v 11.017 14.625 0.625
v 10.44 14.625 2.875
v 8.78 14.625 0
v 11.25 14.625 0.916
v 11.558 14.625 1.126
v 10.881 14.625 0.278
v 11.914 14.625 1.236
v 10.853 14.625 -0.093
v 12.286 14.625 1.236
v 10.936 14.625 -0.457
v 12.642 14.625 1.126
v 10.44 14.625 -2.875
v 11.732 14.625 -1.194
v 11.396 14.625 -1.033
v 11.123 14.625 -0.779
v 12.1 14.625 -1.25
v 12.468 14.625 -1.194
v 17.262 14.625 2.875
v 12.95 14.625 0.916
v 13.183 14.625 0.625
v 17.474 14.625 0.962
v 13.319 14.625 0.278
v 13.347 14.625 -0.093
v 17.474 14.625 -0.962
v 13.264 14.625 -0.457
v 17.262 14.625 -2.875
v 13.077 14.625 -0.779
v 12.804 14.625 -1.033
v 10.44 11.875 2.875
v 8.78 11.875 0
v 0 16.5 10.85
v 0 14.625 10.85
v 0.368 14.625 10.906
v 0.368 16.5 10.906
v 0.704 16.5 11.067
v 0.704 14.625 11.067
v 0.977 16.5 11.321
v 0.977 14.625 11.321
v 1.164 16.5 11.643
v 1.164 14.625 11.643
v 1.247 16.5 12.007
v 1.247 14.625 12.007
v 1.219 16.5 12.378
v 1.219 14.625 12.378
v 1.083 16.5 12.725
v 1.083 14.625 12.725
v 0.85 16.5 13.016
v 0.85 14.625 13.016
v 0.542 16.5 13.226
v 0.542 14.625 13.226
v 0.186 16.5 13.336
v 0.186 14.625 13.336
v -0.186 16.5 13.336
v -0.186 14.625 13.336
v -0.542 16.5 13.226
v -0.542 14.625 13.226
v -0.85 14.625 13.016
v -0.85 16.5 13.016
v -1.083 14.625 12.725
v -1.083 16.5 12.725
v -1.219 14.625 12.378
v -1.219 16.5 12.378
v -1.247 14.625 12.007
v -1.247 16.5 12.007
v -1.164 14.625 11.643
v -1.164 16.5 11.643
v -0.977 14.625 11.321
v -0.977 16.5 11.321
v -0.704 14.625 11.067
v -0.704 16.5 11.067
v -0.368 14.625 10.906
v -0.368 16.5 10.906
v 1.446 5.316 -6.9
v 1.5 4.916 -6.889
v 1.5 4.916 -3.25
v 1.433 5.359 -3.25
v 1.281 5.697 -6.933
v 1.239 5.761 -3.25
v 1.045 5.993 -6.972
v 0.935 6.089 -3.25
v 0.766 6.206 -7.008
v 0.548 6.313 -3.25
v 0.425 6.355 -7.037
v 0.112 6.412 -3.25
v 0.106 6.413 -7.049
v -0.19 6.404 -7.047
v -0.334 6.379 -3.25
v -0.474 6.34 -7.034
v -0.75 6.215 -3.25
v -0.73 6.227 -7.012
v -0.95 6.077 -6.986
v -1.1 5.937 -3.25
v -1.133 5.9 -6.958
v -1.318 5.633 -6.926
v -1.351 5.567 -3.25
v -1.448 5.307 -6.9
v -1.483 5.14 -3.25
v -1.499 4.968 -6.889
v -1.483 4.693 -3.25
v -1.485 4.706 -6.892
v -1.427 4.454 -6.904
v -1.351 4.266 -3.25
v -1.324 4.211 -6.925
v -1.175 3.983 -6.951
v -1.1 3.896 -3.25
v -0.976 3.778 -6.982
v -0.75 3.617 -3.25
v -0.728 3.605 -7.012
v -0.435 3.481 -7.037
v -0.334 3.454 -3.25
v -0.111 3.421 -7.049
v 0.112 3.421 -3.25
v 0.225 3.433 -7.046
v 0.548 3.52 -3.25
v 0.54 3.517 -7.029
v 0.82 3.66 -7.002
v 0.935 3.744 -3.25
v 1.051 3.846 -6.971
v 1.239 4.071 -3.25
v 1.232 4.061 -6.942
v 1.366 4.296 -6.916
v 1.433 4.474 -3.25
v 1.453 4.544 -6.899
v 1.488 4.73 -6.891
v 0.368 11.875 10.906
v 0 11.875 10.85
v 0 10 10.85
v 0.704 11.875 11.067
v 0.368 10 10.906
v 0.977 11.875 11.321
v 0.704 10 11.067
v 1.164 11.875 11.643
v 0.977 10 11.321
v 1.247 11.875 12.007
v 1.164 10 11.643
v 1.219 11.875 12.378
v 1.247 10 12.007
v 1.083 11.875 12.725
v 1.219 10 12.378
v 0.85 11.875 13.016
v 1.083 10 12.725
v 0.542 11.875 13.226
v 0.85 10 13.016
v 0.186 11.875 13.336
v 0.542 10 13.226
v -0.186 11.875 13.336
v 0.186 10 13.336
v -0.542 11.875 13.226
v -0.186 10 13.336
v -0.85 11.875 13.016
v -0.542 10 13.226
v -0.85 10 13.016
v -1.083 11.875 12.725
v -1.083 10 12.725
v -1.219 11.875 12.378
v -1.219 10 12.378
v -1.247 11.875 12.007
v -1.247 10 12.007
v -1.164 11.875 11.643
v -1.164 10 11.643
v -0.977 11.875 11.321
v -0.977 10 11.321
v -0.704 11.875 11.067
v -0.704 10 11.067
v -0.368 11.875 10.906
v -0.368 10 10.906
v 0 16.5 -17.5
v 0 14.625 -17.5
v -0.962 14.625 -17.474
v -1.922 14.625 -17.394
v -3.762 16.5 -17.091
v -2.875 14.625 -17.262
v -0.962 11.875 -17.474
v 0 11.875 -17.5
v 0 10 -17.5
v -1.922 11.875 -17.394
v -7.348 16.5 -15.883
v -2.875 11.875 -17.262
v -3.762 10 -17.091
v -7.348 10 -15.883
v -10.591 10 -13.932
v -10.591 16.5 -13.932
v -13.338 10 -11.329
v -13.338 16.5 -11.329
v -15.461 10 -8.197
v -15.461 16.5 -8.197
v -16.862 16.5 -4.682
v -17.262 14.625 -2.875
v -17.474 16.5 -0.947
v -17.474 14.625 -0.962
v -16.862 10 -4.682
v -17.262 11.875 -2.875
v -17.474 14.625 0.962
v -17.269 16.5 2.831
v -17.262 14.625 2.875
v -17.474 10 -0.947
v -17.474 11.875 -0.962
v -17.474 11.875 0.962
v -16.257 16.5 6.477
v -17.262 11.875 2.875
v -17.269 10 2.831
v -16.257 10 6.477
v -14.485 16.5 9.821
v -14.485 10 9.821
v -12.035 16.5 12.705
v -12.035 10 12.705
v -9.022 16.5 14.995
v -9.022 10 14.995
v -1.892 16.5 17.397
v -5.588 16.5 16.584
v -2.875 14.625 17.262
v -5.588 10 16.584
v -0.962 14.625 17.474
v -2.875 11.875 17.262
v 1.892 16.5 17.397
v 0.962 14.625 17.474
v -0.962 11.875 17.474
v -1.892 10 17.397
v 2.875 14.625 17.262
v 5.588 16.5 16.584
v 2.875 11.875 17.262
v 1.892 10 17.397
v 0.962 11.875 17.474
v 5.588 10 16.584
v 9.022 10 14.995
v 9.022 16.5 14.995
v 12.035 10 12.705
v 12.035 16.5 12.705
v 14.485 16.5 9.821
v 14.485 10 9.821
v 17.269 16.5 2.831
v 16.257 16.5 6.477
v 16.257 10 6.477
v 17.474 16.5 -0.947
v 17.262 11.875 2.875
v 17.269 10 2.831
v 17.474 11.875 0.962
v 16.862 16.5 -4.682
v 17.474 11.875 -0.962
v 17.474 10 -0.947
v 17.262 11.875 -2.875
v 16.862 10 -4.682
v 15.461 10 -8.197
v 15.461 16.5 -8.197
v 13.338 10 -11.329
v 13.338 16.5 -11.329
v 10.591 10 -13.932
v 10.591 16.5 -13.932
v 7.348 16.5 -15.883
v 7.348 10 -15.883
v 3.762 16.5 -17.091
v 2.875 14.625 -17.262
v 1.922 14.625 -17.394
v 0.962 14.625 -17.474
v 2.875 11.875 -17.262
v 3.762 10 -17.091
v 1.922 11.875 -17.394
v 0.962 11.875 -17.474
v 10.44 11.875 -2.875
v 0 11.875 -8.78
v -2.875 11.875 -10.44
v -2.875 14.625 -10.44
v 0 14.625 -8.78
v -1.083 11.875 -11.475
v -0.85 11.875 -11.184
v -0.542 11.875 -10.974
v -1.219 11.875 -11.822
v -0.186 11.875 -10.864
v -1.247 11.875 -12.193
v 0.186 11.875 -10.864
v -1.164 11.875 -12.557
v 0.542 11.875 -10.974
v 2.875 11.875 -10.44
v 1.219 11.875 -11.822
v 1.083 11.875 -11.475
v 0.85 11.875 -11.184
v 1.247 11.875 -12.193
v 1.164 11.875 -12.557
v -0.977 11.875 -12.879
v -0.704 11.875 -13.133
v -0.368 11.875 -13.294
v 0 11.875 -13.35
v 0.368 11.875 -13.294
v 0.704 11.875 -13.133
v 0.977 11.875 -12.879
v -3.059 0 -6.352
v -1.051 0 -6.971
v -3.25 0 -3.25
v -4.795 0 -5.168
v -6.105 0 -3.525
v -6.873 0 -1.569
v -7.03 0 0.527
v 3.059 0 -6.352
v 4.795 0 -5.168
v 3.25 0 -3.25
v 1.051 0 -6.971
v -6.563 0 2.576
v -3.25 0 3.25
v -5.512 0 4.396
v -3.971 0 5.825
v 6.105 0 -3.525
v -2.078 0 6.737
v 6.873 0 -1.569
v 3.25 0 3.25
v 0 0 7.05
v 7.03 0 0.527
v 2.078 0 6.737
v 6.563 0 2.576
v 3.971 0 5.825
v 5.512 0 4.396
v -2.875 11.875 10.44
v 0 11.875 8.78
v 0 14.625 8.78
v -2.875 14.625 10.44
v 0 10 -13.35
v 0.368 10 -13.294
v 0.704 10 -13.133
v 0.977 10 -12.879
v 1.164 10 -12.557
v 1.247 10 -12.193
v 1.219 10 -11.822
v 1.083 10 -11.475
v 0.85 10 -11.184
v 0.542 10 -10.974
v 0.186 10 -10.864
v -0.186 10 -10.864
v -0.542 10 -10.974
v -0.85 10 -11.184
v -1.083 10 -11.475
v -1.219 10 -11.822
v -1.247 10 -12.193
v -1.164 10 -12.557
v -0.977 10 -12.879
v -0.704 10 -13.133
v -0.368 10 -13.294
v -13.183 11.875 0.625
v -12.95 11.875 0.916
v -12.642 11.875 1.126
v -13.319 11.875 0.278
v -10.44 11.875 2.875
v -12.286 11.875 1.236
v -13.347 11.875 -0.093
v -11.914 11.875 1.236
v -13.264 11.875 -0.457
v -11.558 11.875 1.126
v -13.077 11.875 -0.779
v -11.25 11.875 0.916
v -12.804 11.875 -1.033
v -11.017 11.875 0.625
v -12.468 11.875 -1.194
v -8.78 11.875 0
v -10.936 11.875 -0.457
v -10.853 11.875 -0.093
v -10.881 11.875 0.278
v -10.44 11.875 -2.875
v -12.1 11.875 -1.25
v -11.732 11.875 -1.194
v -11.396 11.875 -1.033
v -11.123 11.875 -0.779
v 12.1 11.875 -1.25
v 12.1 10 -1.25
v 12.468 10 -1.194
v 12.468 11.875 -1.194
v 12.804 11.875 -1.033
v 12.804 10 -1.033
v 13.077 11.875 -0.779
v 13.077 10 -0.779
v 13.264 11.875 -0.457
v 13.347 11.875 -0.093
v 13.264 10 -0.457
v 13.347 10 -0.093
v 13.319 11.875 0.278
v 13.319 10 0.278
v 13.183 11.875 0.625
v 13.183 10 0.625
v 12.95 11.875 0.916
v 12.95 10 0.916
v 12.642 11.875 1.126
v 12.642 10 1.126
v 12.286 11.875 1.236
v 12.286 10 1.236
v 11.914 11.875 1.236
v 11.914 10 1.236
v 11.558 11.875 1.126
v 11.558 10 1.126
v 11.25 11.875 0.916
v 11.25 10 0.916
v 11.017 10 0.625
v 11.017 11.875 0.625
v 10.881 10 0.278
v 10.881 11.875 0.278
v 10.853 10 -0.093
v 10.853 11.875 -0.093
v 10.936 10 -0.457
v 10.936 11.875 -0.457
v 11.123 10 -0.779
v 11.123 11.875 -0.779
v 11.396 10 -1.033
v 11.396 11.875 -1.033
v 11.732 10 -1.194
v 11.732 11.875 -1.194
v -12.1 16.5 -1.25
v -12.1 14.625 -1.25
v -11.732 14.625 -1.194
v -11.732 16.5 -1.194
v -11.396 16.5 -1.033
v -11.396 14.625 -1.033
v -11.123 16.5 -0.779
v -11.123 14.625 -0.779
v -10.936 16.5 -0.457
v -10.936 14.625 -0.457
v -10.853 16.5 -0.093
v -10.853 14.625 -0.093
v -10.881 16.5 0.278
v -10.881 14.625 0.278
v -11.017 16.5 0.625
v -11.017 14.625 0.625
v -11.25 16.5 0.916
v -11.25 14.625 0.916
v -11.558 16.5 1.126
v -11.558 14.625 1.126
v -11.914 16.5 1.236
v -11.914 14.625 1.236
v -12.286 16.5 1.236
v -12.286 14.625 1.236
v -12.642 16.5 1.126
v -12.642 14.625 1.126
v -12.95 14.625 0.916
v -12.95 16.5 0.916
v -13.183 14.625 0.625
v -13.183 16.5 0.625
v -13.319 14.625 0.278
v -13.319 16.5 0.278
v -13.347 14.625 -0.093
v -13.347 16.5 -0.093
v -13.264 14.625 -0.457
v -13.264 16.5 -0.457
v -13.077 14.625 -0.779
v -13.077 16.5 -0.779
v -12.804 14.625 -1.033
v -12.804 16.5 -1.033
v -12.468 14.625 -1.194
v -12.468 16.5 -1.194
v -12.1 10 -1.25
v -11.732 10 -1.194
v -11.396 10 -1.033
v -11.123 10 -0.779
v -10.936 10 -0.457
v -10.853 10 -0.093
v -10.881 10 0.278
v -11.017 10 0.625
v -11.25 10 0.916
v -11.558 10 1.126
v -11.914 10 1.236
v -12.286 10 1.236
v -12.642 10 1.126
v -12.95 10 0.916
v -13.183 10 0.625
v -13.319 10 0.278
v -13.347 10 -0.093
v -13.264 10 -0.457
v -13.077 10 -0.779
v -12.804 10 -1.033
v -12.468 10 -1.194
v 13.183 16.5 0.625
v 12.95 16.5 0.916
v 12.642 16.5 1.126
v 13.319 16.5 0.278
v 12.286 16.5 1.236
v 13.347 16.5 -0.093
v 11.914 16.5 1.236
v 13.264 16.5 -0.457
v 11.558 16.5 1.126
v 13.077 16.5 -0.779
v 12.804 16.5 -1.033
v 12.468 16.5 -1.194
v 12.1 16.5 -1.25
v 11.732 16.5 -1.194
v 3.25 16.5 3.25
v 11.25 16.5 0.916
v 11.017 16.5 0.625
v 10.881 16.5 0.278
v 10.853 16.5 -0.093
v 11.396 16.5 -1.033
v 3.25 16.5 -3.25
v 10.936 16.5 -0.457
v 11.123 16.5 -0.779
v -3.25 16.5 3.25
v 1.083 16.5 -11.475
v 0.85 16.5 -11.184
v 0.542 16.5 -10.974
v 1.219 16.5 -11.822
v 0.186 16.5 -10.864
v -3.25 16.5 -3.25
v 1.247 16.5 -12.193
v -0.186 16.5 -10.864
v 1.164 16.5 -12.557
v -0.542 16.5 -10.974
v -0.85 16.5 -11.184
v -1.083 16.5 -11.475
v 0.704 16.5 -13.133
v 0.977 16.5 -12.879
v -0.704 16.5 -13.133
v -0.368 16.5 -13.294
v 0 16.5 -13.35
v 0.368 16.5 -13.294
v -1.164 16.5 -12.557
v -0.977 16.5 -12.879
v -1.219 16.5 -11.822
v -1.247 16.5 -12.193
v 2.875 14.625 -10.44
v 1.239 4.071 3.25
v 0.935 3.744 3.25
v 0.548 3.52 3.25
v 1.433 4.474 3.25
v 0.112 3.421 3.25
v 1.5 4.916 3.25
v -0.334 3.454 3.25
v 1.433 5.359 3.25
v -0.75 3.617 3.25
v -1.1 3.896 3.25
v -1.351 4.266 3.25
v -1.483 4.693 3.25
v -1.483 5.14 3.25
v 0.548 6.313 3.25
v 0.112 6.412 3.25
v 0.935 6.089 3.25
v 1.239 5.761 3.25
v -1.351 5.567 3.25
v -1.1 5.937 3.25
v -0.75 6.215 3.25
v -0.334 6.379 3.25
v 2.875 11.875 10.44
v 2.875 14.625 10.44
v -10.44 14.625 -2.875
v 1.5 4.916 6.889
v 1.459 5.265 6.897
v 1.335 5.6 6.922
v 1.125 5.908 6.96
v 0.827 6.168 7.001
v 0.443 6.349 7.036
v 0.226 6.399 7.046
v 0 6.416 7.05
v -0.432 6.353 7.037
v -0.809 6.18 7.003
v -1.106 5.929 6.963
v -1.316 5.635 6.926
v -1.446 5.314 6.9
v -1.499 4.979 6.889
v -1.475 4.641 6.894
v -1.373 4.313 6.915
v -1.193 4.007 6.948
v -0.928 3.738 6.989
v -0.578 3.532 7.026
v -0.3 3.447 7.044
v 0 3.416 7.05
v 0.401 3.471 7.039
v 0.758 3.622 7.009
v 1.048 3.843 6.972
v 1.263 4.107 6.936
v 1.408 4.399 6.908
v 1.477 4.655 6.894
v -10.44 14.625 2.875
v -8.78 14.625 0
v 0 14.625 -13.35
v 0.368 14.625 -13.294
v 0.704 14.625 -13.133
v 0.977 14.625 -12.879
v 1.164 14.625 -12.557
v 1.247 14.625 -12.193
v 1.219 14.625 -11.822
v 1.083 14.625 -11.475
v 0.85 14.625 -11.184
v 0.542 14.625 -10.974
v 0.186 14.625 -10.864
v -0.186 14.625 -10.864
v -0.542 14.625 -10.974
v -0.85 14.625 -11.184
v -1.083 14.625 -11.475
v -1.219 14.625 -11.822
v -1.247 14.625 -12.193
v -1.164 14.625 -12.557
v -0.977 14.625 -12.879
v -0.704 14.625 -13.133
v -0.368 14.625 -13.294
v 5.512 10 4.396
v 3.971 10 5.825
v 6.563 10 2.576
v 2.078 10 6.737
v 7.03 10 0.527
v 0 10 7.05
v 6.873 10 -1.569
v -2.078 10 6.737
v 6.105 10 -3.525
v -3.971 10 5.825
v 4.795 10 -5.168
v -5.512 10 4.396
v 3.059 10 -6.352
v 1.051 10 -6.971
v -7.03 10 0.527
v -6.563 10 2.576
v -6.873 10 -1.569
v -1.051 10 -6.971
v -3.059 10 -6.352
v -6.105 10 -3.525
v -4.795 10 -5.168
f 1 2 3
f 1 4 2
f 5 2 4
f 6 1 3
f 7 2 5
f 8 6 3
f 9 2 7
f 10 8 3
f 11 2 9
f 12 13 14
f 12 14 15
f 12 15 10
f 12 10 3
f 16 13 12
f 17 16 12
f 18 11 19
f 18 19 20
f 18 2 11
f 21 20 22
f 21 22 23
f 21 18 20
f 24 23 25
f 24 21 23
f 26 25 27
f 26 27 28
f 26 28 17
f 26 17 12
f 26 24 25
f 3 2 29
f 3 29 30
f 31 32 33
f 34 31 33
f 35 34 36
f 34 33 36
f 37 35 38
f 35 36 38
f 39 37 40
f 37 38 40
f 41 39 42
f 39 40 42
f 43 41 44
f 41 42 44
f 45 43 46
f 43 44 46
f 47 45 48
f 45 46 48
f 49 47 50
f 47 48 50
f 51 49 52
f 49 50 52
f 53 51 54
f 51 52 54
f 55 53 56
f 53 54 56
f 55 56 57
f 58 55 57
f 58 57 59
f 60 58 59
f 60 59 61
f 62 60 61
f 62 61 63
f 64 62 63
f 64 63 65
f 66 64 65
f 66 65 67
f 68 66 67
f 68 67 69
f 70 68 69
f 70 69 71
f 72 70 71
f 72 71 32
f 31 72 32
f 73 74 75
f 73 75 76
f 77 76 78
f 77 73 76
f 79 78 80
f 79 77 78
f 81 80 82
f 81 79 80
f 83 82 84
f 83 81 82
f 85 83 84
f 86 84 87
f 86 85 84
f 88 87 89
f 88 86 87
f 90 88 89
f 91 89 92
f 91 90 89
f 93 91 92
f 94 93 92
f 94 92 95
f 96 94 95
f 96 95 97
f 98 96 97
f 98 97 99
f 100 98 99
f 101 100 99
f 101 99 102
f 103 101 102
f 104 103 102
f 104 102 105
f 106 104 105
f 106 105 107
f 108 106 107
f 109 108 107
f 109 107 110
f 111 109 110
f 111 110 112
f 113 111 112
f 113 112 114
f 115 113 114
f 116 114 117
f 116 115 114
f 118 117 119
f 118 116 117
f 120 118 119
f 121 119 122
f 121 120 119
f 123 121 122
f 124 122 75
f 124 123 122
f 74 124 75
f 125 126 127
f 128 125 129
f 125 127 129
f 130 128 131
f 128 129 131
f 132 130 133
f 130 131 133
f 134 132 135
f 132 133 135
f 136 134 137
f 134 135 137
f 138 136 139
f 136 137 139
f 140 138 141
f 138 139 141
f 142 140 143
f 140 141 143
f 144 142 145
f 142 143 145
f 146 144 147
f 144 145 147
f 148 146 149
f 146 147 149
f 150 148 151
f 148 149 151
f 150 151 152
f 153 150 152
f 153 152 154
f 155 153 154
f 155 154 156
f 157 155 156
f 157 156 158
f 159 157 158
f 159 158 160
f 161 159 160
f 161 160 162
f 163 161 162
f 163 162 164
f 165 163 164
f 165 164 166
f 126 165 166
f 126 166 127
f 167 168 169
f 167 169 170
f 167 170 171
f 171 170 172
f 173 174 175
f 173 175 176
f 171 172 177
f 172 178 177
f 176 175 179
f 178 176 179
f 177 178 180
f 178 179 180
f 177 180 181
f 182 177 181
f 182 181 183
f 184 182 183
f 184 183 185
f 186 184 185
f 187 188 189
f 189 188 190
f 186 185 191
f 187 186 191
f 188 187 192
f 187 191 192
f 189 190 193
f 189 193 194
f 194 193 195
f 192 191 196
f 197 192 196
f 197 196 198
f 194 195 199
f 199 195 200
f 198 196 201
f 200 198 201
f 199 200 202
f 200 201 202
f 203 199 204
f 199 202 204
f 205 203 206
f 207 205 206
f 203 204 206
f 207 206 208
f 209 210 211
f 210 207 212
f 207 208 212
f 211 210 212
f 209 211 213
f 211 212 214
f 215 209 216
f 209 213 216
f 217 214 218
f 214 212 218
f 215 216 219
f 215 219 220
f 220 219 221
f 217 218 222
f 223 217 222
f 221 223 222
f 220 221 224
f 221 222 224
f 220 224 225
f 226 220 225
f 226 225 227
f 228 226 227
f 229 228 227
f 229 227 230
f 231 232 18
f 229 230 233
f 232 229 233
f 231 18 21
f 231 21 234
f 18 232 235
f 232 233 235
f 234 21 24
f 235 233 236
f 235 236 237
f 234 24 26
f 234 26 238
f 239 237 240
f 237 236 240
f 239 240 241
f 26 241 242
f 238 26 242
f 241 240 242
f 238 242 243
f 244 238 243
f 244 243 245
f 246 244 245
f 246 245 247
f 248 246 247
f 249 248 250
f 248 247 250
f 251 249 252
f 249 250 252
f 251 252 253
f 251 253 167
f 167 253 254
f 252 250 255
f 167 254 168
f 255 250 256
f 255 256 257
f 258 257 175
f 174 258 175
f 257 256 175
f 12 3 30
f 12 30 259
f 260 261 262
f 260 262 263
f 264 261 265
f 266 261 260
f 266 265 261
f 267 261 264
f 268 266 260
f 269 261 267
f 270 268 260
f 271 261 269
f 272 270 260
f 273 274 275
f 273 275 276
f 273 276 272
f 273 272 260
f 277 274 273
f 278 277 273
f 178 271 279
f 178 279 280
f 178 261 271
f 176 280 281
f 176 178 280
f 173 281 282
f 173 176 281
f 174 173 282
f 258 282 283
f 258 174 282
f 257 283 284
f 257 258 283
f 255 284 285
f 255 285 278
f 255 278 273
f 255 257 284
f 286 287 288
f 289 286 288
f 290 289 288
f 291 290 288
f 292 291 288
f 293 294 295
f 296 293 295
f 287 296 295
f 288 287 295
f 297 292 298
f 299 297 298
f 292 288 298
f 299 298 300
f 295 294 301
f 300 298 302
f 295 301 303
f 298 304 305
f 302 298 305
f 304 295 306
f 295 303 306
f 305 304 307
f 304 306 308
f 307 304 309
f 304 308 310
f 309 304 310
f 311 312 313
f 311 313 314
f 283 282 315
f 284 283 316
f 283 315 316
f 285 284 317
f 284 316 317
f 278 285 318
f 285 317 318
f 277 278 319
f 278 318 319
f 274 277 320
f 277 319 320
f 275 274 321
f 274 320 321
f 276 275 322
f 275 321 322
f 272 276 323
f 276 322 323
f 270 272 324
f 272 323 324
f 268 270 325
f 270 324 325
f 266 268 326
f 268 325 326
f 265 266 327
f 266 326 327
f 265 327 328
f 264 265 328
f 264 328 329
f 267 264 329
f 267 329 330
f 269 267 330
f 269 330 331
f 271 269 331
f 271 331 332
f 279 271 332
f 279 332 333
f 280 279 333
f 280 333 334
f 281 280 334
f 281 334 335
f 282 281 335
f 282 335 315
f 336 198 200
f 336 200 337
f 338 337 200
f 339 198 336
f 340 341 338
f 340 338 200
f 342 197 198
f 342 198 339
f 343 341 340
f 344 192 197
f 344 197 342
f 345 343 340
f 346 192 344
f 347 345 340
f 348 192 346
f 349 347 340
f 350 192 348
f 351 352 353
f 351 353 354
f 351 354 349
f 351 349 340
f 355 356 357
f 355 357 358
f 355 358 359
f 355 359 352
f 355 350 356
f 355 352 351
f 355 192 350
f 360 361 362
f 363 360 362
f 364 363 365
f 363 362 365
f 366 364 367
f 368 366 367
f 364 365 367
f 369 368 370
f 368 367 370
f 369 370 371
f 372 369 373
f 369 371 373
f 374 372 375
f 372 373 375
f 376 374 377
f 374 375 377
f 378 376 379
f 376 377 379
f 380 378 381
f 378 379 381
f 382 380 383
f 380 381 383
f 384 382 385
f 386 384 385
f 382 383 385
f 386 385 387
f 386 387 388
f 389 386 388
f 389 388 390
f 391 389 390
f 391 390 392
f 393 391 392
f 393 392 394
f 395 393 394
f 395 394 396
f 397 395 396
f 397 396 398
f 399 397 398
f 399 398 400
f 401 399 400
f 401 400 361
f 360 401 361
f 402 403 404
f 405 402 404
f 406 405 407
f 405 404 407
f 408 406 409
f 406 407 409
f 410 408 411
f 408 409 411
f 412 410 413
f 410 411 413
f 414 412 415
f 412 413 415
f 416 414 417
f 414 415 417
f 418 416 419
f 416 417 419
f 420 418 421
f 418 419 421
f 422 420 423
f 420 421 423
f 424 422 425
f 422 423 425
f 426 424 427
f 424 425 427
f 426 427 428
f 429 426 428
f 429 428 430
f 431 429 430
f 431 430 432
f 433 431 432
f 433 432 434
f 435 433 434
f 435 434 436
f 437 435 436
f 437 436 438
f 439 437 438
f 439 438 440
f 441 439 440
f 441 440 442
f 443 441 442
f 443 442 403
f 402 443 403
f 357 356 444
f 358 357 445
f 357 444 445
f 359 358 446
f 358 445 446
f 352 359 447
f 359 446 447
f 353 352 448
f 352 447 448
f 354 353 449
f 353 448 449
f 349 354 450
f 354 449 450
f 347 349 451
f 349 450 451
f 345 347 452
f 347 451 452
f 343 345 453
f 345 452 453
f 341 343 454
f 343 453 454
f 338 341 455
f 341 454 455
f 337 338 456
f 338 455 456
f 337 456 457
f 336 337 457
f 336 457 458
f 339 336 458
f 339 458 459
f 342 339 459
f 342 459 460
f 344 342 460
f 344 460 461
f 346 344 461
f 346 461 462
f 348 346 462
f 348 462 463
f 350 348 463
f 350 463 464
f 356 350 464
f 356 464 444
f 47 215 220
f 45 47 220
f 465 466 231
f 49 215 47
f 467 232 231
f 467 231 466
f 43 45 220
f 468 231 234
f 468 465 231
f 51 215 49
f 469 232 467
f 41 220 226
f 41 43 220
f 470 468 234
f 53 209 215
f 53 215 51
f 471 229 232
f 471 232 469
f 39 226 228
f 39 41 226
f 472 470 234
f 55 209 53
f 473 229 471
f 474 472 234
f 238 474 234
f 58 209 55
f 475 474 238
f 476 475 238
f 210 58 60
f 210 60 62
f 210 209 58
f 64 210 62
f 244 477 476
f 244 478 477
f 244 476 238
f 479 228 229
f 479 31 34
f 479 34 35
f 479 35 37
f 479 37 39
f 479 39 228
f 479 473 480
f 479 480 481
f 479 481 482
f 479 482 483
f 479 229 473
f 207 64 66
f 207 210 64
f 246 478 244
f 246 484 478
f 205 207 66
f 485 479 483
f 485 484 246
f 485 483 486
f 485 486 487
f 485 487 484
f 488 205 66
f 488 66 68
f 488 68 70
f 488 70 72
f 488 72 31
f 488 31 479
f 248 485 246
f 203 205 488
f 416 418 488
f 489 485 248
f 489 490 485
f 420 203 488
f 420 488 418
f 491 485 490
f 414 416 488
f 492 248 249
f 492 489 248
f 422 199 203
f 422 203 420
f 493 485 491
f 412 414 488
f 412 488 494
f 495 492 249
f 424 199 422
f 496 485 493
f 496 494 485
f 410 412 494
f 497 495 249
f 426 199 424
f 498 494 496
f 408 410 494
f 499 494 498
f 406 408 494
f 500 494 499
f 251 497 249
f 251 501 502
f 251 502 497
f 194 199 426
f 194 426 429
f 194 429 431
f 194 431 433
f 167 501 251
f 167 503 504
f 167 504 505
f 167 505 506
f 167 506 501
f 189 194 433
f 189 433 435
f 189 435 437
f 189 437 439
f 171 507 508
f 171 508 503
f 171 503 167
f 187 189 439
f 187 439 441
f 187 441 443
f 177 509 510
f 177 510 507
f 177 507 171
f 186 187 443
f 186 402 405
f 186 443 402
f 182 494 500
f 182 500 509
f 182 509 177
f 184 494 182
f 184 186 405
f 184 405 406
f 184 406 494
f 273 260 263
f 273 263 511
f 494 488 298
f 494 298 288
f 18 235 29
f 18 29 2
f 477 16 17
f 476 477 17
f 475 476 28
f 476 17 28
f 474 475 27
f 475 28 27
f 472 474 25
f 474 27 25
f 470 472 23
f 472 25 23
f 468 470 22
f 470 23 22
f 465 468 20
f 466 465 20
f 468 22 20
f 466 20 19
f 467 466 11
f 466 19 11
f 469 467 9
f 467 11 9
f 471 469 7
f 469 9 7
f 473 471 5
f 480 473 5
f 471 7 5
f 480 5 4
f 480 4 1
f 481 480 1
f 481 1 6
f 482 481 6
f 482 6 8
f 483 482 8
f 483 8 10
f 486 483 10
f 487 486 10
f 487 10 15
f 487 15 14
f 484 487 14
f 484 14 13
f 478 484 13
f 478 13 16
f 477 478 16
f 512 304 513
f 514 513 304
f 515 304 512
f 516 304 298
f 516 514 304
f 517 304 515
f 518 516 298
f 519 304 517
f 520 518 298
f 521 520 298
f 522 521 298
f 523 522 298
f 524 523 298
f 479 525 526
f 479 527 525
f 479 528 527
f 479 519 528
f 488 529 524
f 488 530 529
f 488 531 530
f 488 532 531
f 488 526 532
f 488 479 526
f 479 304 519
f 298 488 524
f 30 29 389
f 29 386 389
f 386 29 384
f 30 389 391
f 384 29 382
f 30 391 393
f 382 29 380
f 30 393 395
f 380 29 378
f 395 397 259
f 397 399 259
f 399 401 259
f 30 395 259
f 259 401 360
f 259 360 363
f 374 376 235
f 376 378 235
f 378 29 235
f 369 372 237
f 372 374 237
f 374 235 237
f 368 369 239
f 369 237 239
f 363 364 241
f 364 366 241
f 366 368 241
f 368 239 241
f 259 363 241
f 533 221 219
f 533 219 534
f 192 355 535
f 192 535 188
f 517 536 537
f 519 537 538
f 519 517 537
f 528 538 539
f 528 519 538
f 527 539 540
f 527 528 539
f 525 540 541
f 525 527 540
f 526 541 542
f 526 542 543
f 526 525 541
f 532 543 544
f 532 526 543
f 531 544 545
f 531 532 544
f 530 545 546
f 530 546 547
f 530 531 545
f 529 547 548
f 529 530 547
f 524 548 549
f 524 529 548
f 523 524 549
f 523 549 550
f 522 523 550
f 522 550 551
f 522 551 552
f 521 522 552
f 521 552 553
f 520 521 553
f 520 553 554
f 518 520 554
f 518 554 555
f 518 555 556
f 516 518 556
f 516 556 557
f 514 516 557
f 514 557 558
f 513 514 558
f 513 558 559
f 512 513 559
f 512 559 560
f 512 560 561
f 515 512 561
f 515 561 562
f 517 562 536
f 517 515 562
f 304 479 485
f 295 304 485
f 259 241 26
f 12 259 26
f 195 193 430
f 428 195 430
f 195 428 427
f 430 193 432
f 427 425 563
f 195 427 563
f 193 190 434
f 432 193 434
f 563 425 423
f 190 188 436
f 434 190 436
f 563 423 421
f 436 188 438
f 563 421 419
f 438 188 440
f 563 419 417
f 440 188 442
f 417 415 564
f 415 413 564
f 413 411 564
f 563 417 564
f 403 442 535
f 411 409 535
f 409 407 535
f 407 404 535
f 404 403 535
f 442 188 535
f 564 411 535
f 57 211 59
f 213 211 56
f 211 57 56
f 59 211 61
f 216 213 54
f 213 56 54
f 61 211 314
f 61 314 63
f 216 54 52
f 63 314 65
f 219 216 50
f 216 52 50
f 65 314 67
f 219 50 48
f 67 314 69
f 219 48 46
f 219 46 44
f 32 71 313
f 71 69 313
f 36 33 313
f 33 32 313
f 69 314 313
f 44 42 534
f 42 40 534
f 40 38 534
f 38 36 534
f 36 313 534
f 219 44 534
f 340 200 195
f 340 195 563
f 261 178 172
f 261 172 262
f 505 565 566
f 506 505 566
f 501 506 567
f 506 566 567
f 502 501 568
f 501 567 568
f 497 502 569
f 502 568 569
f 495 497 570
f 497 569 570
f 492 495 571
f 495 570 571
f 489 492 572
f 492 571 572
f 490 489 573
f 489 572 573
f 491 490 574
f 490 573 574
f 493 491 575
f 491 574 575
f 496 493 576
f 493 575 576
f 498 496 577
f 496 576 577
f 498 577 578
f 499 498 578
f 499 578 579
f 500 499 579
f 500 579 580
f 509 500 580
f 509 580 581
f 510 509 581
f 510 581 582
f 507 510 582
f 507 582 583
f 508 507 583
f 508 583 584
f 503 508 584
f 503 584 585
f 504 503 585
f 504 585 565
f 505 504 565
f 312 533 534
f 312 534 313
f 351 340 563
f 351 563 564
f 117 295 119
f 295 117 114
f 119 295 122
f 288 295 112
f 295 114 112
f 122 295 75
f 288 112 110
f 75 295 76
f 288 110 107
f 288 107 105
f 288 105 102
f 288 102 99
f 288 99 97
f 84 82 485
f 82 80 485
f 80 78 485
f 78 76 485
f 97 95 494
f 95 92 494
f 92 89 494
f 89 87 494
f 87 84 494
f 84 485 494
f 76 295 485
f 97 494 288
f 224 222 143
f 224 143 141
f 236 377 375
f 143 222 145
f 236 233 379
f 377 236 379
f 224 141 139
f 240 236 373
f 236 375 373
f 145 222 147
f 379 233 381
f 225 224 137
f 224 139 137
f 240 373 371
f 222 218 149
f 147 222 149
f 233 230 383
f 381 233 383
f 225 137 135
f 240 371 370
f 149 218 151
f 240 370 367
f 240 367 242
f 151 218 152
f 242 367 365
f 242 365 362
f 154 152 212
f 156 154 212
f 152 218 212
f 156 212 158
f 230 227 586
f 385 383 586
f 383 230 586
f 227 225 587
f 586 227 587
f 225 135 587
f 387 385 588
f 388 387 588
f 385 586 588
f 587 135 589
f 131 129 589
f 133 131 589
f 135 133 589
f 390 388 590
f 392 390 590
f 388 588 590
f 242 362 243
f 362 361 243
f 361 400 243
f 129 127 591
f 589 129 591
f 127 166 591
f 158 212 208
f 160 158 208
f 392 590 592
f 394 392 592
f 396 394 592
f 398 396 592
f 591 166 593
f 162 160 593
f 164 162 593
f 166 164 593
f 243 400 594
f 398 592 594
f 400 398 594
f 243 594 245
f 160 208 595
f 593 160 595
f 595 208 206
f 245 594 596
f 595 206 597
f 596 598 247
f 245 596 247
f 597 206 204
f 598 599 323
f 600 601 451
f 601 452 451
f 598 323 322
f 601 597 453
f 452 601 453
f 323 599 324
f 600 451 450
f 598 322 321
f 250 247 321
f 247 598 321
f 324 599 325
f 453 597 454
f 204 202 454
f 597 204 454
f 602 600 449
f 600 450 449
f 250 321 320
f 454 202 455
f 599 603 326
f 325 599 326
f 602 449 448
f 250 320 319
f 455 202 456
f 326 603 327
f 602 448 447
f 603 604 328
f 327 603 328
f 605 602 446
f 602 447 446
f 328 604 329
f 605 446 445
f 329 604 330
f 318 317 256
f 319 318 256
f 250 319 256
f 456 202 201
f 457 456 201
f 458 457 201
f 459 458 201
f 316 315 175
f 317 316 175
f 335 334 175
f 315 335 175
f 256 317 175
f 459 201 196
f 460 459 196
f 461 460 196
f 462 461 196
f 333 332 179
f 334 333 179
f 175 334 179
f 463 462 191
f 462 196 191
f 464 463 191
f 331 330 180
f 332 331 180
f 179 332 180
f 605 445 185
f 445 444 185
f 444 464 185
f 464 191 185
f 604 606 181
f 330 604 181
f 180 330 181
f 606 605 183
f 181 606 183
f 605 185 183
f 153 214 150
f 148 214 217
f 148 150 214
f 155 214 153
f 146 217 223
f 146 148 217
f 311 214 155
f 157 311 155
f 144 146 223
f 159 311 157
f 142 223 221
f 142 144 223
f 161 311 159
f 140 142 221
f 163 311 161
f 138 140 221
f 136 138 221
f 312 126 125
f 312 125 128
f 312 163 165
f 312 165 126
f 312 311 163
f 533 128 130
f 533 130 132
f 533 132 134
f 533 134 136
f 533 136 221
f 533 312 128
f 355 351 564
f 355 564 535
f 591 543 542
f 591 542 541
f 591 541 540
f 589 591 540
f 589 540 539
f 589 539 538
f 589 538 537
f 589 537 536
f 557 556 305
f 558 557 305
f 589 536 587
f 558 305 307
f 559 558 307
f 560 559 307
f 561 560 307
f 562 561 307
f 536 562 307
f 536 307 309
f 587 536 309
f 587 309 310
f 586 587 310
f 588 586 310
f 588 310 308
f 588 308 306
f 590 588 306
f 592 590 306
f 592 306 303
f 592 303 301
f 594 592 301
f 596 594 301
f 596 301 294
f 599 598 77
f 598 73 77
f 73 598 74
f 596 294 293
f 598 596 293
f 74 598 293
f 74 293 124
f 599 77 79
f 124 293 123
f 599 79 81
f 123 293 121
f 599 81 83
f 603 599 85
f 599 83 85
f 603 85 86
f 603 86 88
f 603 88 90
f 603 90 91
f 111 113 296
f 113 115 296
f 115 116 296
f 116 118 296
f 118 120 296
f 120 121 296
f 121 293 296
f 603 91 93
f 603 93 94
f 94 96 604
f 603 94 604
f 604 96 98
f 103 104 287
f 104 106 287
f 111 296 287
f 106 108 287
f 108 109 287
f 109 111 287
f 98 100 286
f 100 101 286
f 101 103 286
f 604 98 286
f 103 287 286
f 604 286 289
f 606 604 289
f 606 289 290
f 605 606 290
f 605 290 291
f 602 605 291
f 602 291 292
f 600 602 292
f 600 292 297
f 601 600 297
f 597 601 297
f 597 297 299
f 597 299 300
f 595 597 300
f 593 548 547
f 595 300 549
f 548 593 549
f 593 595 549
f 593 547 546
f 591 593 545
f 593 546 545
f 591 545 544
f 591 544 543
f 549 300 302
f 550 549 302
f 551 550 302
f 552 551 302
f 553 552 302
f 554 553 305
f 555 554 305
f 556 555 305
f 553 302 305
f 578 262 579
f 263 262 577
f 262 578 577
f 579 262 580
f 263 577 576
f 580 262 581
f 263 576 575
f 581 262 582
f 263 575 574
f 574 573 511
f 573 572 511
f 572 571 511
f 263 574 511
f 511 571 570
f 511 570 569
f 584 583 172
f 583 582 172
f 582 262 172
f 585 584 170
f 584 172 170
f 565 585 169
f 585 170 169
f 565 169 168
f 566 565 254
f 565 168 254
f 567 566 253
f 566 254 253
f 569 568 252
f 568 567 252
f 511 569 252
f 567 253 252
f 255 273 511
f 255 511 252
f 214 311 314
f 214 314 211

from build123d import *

# Parameters (mm, degrees)
SKETCH1_R               = 7.05
SKETCH1_W               = 6.5
SKETCH1_H               = 6.5
BOSS_EXTRUDE1_DEPTH     = 10
SKETCH2_R               = 17.5
BOSS_EXTRUDE2_DEPTH     = 6.5
CUT_EXTRUDE1_REACH      = 28.693
SKETCH3_R               = 1.25
CUT_EXTRUDE2_DEPTH      = 30.744747435
CUT_EXTRUDE2_DEPTH_BACK = 30.744747435
SKETCH4_R               = 1.5
CUT_EXTRUDE3_DEPTH      = 10
CUT_EXTRUDE3_DEPTH_BACK = 10
SKETCH6_W               = 6.5
SKETCH6_H               = 6.5
SKETCH8_W               = 5.75
SKETCH8_H               = 2.75
CUT_EXTRUDE4_DEPTH      = 5
CUT_EXTRUDE5_DEPTH      = 2.75
CIRPATTERN1_START       = 11.875
CIRPATTERN1_OUTLINE_R   = 1.25
CIRPATTERN1_DEPTH       = 2.75


# Read off the part's stored shape, not the designer's step: CirPattern1
with BuildPart() as part:
    # Sketch1 → Boss-Extrude1 (new body)
    with BuildSketch(Plane(origin=(0, 0, 0), x_dir=(1, 0, 0), z_dir=(0, 1, 0))):
        with Locations(Location((0, 0, 0), (0, 0, 270))):
            Circle(SKETCH1_R)
        Rectangle(SKETCH1_W, SKETCH1_H, mode=Mode.SUBTRACT)
    extrude(amount=BOSS_EXTRUDE1_DEPTH)

    # Sketch2 → Boss-Extrude2 (add)
    with BuildSketch(Plane(origin=(0, 10, 0), x_dir=(1, 0, 0), z_dir=(0, 1, 0))):
        with Locations(Location((0, 0, 0), (0, 0, 90))):
            Circle(SKETCH2_R)
    extrude(amount=BOSS_EXTRUDE2_DEPTH)

    # Sketch3 → Cut-Extrude1 (cut, up to next)
    with BuildSketch(Plane.XZ.offset(-10), mode=Mode.PRIVATE) as cut_extrude1_sk1:
        with Locations(Location((12.1, 0, 0), (0, 0, 270))):
            Circle(SKETCH3_R)
    cut_extrude1_tool1 = extrude(cut_extrude1_sk1.sketch, amount=-CUT_EXTRUDE1_REACH, mode=Mode.PRIVATE) & part.part
    # Sketch3 → Cut-Extrude1 (cut, up to next)
    with BuildSketch(Plane.XZ.offset(-10), mode=Mode.PRIVATE) as cut_extrude1_sk2:
        with Locations(Location((0, -12.1, 0), (0, 0, 270))):
            Circle(SKETCH3_R)
    cut_extrude1_tool2 = extrude(cut_extrude1_sk2.sketch, amount=-CUT_EXTRUDE1_REACH, mode=Mode.PRIVATE) & part.part
    # Sketch3 → Cut-Extrude1 (cut, up to next)
    with BuildSketch(Plane.XZ.offset(-10), mode=Mode.PRIVATE) as cut_extrude1_sk3:
        with Locations(Location((-12.1, 0, 0), (0, 0, 270))):
            Circle(SKETCH3_R)
    cut_extrude1_tool3 = extrude(cut_extrude1_sk3.sketch, amount=-CUT_EXTRUDE1_REACH, mode=Mode.PRIVATE) & part.part
    # Sketch3 → Cut-Extrude1 (cut, up to next)
    with BuildSketch(Plane.XZ.offset(-10), mode=Mode.PRIVATE) as cut_extrude1_sk4:
        with Locations(Location((0, 12.1, 0), (0, 0, 270))):
            Circle(SKETCH3_R)
    cut_extrude1_tool4 = extrude(cut_extrude1_sk4.sketch, amount=-CUT_EXTRUDE1_REACH, mode=Mode.PRIVATE) & part.part
    add(cut_extrude1_tool1.solids().sort_by_distance((12.1, 10, 0))[0], mode=Mode.SUBTRACT)
    add(cut_extrude1_tool2.solids().sort_by_distance((0, 10, -12.1))[0], mode=Mode.SUBTRACT)
    add(cut_extrude1_tool3.solids().sort_by_distance((-12.1, 10, 0))[0], mode=Mode.SUBTRACT)
    add(cut_extrude1_tool4.solids().sort_by_distance((0, 10, 12.1))[0], mode=Mode.SUBTRACT)

    # Sketch4 → Cut-Extrude2 (cut, two sides: drawn at the far end of the back side and taken through both)
    with BuildSketch(Plane.XY.offset(-CUT_EXTRUDE2_DEPTH_BACK)):
        with Locations((0, 4.916404418)):
            Circle(SKETCH4_R)
    extrude(amount=CUT_EXTRUDE2_DEPTH + CUT_EXTRUDE2_DEPTH_BACK, mode=Mode.SUBTRACT)

    # Sketch6 → Cut-Extrude3 (cut, two sides: drawn at the far end of the back side and taken through both)
    with BuildSketch(Plane(origin=(0, 10, 0), x_dir=(-1, 0, 0), z_dir=(0, -1, 0)).offset(-CUT_EXTRUDE3_DEPTH_BACK)):
        Rectangle(SKETCH6_W, SKETCH6_H)
    extrude(amount=CUT_EXTRUDE3_DEPTH + CUT_EXTRUDE3_DEPTH_BACK, mode=Mode.SUBTRACT)

    # Sketch8 → Cut-Extrude4 (cut)
    with BuildSketch(Plane(origin=(17.5, 0, 0), x_dir=(0, 0, -1), z_dir=(1, 0, 0))):
        with Locations((0, 13.25)):
            Rectangle(SKETCH8_W, SKETCH8_H)
    extrude(amount=-CUT_EXTRUDE4_DEPTH, mode=Mode.SUBTRACT)

    # Sketch9 → Cut-Extrude5 (cut)
    with BuildSketch(Plane.XZ.offset(-14.625)):
        Polygon((15.419764048, 0), (13.759882024, 2.875), (10.440117976, 2.875), (8.780235952, 0), (10.440117976, -2.875), (13.759882024, -2.875), align=None)
    extrude(amount=CUT_EXTRUDE5_DEPTH, mode=Mode.SUBTRACT)

    # CirPattern1 outline → CirPattern1 (cut)
    # profile 1 of 3: a face of its own
    with BuildSketch(Plane(origin=(0, 0, 0), x_dir=(1, 0, 0), z_dir=(0, 1, 0)).offset(CIRPATTERN1_START)):
        with BuildLine():
            Line((-8.780235952, 0), (-10.440117976, 2.875))
            Line((-10.440117976, 2.875), (-17.26222393, 2.875))
            ThreePointArc((-17.26222393, 2.875), (-17.5, 0), (-17.26222393, -2.875))
            Line((-17.26222393, -2.875), (-10.440117976, -2.875))
            Line((-10.440117976, -2.875), (-8.780235952, 0))
        make_face()
        with Locations((-12.1, 0)):
            Circle(CIRPATTERN1_OUTLINE_R, mode=Mode.SUBTRACT)
    # profile 2 of 3: a face of its own
    with BuildSketch(Plane(origin=(0, 0, 0), x_dir=(1, 0, 0), z_dir=(0, 1, 0)).offset(CIRPATTERN1_START)):
        with BuildLine():
            ThreePointArc((2.875, 17.26222393), (0, 17.5), (-2.875, 17.26222393))
            Line((-2.875, 17.26222393), (-2.875, 10.440117976))
            Line((-2.875, 10.440117976), (0, 8.780235952))
            Line((0, 8.780235952), (2.875, 10.440117976))
            Line((2.875, 10.440117976), (2.875, 17.26222393))
        make_face()
        with Locations((0, 12.1)):
            Circle(CIRPATTERN1_OUTLINE_R, mode=Mode.SUBTRACT)
    # profile 3 of 3: a face of its own
    with BuildSketch(Plane(origin=(0, 0, 0), x_dir=(1, 0, 0), z_dir=(0, 1, 0)).offset(CIRPATTERN1_START)):
        with BuildLine():
            Line((-2.875, -10.440117976), (-2.875, -17.26222393))
            ThreePointArc((-2.875, -17.26222393), (0, -17.5), (2.875, -17.26222393))
            Line((2.875, -17.26222393), (2.875, -10.440117976))
            Line((2.875, -10.440117976), (0, -8.780235952))
            Line((0, -8.780235952), (-2.875, -10.440117976))
        make_face()
        with Locations((0, -12.1)):
            Circle(CIRPATTERN1_OUTLINE_R, mode=Mode.SUBTRACT)
    extrude(amount=CIRPATTERN1_DEPTH, mode=Mode.SUBTRACT)


solid = part.part
